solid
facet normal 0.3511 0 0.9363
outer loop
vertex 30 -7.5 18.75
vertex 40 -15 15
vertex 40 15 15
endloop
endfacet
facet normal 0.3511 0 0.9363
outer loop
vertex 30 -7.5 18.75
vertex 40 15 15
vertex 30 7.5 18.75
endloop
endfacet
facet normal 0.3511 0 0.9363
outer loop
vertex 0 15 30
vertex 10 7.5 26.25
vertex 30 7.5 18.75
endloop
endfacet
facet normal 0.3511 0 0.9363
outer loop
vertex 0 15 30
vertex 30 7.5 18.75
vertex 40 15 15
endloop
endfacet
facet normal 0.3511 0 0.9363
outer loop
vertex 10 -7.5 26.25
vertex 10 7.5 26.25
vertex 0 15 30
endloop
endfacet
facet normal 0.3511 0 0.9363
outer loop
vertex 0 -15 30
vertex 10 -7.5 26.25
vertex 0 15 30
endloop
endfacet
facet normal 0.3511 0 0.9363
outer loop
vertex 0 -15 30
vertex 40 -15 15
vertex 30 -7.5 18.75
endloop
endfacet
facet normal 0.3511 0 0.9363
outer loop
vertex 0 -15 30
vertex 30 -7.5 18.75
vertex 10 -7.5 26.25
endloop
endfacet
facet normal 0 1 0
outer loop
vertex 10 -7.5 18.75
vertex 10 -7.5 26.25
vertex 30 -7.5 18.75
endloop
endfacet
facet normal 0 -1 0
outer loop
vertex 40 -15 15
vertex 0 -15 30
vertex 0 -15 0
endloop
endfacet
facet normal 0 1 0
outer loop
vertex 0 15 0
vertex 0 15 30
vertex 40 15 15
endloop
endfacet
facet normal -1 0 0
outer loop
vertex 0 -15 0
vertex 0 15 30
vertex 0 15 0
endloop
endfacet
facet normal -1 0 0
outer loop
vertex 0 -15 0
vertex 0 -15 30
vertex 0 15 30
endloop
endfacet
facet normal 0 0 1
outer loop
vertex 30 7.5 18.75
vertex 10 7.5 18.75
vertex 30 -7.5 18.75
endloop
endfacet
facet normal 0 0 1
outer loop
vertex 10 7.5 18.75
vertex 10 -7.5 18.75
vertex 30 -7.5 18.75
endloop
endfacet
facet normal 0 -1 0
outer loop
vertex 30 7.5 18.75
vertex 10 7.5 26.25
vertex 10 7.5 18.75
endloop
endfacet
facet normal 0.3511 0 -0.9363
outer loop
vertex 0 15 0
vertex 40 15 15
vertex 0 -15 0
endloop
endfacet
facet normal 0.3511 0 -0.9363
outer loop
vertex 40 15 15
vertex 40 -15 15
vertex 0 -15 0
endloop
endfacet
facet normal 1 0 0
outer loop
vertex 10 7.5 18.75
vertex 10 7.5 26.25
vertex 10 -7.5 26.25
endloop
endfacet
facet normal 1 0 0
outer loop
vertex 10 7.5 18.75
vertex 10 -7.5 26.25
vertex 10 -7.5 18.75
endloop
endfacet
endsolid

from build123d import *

# Parameters (mm, degrees)
F1_DEPTH = 15
F2_DEPTH = 7.5
F3_DEPTH = 15


with BuildPart() as f1:
    # F0 (on Front) → F1 (new body, symmetric)
    with BuildSketch(Plane.XZ):
        Polygon((40, 15), (0, 0), (40, 0), align=None)
        Polygon((30, 18.75), (10, 26.25), (10, 18.75), align=None)
        Polygon((0, 30), (0, 0), (40, 15), (30, 18.75), (10, 18.75), (10, 26.25), align=None)
    extrude(amount=F1_DEPTH, both=True)

    # F0 (on Front) → F2 (cut, symmetric)
    with BuildSketch(Plane.XZ):
        Polygon((30, 18.75), (10, 26.25), (10, 18.75), align=None)
    extrude(amount=F2_DEPTH, both=True, mode=Mode.SUBTRACT)

    # F0 (on Front) → F3 (cut, symmetric)
    with BuildSketch(Plane.XZ):
        Polygon((40, 15), (0, 0), (40, 0), align=None)
    extrude(amount=F3_DEPTH, both=True, mode=Mode.SUBTRACT)


solid = f1.part
